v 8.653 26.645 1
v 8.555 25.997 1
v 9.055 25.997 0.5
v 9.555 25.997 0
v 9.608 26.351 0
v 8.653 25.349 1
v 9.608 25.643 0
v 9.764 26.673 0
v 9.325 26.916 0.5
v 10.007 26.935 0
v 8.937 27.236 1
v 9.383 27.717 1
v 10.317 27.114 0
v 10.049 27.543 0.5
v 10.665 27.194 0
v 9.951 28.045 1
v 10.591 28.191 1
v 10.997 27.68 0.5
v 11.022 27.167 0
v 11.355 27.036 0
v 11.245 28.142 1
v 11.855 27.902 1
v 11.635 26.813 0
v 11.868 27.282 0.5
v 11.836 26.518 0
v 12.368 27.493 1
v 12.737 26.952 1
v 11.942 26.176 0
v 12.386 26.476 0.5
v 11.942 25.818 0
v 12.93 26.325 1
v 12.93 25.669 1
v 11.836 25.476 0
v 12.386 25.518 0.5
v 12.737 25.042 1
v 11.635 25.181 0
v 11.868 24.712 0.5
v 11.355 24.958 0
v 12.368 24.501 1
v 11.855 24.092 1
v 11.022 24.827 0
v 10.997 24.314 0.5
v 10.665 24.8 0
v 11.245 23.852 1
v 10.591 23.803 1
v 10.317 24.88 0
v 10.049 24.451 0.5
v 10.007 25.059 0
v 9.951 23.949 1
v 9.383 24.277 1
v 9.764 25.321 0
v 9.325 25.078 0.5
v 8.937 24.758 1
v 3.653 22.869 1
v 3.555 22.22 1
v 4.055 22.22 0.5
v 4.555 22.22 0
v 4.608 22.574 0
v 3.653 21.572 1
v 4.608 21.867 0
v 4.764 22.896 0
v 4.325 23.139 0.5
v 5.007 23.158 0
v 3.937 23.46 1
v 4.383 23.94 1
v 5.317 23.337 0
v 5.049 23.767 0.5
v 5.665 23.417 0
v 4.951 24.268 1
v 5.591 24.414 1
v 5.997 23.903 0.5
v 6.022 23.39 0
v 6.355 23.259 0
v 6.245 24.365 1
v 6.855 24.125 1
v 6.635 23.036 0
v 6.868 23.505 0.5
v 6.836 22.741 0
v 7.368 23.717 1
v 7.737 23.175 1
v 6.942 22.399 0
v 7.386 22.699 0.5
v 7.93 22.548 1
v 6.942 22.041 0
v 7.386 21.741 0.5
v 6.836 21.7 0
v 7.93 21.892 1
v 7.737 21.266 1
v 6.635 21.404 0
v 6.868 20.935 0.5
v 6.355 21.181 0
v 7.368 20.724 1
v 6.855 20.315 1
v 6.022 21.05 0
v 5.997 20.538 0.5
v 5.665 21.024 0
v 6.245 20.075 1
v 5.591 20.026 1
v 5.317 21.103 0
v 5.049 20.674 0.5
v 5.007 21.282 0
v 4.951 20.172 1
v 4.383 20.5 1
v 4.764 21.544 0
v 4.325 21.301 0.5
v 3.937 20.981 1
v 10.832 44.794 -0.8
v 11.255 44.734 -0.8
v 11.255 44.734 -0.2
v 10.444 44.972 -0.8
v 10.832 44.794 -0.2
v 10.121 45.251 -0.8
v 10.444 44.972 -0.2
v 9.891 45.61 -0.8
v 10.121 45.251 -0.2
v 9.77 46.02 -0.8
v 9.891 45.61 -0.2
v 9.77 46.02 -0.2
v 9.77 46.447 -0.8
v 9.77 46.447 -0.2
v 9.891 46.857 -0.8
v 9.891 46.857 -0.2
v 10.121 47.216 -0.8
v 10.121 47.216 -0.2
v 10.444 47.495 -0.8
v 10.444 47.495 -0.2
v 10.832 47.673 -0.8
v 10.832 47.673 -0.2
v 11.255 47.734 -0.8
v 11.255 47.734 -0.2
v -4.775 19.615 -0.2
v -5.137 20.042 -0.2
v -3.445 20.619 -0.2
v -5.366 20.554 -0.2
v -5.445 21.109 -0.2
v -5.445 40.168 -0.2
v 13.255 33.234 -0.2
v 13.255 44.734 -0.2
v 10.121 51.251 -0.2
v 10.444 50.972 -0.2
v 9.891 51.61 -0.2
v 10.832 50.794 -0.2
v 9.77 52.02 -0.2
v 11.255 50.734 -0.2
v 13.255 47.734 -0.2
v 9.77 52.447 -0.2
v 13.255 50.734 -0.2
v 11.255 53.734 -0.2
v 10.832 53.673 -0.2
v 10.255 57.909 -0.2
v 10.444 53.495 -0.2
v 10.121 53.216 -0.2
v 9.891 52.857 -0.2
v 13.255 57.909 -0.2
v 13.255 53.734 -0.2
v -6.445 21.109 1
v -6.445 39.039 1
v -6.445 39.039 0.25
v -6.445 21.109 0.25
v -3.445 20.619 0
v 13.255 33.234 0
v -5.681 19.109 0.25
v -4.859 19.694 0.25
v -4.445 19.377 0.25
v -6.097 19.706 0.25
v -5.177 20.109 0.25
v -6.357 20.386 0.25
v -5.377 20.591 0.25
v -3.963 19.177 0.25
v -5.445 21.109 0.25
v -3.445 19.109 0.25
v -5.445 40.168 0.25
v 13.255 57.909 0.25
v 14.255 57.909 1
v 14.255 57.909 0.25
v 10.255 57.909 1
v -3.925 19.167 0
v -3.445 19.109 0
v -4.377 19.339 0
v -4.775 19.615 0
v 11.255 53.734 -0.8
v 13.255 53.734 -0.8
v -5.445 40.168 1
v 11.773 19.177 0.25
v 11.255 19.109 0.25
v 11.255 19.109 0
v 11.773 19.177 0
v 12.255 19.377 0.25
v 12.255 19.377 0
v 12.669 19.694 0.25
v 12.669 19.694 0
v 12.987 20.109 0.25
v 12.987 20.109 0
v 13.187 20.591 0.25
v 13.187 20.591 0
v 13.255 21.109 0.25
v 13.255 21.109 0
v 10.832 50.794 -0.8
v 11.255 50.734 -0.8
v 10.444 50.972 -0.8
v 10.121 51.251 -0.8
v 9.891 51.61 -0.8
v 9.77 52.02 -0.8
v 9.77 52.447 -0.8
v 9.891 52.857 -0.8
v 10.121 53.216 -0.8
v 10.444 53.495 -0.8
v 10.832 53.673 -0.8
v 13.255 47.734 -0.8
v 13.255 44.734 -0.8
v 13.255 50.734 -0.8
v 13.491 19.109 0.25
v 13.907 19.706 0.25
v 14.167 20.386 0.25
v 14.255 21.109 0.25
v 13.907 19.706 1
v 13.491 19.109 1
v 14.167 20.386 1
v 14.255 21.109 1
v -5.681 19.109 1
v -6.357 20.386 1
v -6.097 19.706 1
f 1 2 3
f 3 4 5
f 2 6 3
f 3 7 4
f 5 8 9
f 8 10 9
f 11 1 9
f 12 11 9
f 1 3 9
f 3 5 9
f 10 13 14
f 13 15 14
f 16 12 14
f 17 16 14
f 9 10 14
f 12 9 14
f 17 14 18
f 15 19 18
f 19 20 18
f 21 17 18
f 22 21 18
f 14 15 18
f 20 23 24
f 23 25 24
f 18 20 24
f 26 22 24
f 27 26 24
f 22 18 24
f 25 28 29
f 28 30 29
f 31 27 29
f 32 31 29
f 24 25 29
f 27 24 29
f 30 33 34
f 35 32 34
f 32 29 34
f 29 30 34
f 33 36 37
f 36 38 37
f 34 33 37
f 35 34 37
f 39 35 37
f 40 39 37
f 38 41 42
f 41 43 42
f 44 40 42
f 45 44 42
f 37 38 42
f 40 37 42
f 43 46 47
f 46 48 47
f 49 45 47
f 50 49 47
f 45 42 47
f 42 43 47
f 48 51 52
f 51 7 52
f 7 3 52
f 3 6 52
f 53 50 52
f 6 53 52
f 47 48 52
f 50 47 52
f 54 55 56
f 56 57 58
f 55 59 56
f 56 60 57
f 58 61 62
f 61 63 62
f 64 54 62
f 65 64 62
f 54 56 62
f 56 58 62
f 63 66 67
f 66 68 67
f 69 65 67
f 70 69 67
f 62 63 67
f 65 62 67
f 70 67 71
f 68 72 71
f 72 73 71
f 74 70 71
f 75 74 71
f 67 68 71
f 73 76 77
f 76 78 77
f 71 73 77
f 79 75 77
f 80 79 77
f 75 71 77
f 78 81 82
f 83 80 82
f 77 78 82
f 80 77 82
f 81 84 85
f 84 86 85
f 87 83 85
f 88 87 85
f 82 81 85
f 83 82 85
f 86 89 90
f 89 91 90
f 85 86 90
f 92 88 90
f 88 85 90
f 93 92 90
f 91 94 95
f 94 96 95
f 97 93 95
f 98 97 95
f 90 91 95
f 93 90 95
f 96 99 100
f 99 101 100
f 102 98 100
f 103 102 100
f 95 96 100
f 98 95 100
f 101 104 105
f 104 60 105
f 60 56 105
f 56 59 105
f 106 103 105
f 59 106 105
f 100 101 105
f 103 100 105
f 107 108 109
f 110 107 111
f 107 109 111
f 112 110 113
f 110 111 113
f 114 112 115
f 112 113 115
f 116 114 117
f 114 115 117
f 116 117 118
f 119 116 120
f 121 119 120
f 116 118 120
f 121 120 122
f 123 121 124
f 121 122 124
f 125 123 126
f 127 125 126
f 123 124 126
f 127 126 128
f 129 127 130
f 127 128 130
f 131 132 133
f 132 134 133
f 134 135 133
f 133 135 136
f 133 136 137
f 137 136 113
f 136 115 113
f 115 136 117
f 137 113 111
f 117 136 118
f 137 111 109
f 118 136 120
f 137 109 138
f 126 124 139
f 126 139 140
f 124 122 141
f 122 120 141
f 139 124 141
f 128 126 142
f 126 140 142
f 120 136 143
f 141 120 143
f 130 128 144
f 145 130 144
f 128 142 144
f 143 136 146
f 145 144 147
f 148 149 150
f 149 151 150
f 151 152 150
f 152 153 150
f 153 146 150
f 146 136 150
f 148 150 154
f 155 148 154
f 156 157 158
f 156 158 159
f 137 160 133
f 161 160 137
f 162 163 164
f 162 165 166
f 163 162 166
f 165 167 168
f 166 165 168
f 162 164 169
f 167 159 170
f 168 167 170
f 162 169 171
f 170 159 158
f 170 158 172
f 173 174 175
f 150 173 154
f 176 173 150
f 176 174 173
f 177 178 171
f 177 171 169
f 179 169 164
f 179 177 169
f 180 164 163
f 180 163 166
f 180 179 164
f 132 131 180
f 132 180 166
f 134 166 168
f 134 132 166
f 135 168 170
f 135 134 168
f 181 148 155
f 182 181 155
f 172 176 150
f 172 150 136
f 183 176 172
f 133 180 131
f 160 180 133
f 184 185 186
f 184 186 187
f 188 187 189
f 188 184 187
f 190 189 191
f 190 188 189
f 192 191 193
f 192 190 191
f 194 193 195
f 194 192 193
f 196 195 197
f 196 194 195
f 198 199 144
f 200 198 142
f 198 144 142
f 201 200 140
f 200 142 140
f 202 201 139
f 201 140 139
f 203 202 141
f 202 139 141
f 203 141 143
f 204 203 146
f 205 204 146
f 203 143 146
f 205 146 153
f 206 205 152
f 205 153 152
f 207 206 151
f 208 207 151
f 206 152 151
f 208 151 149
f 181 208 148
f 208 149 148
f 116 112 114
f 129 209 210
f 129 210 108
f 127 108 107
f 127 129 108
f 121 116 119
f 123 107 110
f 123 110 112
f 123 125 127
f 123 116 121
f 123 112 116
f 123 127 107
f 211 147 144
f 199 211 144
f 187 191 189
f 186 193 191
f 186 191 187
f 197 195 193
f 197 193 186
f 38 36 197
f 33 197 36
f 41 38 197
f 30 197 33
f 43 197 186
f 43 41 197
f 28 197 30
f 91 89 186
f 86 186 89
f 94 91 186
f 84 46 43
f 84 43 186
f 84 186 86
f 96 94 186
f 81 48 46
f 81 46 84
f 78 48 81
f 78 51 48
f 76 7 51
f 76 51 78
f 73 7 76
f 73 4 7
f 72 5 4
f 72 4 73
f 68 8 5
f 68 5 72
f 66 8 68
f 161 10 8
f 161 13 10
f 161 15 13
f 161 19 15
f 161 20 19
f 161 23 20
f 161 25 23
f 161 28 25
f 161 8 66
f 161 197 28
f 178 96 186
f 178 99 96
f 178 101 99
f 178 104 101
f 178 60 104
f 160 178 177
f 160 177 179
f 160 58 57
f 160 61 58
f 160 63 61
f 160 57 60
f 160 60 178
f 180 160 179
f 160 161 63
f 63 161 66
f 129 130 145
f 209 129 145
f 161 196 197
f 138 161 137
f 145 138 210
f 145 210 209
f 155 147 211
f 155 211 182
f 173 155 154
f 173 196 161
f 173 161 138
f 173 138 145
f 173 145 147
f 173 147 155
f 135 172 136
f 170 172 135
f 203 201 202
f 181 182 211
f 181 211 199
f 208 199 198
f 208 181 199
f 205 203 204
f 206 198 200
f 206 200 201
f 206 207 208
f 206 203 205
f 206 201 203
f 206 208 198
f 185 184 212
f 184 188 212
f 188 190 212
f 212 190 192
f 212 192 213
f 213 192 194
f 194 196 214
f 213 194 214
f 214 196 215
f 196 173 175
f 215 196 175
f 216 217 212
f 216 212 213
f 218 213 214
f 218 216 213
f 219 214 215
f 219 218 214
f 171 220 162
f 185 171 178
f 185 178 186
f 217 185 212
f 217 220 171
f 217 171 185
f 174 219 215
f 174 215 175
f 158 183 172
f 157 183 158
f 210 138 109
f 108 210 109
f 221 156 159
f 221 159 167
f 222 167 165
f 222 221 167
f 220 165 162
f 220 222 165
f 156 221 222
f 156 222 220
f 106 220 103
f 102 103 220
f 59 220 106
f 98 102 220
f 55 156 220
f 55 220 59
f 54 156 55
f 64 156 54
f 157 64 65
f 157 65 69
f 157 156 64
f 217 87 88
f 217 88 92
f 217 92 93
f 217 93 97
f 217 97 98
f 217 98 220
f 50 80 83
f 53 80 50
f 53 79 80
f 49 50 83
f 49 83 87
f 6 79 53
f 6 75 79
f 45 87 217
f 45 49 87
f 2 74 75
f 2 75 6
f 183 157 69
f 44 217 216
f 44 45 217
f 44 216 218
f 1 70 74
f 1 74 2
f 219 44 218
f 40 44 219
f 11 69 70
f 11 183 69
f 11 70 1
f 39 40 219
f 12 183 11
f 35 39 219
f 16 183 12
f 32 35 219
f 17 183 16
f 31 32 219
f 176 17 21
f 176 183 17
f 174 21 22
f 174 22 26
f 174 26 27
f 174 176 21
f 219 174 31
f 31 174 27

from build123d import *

# Parameters (mm, degrees)
BOSS_EXTRUDE1_DEPTH                             = 0.8
BOSS_EXTRUDE1_2_DEPTH                           = 0.8
BOSS_EXTRUDE3_DEPTH                             = 1
BOSS_EXTRUDE3_DEPTH_BACK                        = 0.2
FILLET1_R                                       = 2
CUT_EXTRUDE1_DEPTH                              = 0.2
BOSS_EXTRUDE4_DEPTH                             = 0.75
CSK_FOR_M2_FLAT_HEAD_MACHINE_SCREW1_D           = 2.4
CSK_FOR_M2_FLAT_HEAD_MACHINE_SCREW1_DEPTH       = 4
CSK_FOR_M2_FLAT_HEAD_MACHINE_SCREW1_CSINK_D     = 4.4
CSK_FOR_M2_FLAT_HEAD_MACHINE_SCREW1_CSINK_ANGLE = 90
CSK_FOR_M2_FLAT_HEAD_MACHINE_SCREW1_TIP         = 0.721032743


with BuildPart() as part:
    # Sketch1 → Boss-Extrude1 (new body)
    with BuildSketch(Plane.XY):
        with BuildLine():
            Line((11.255059848, 53.733600539), (13.255059848, 53.733600539))
            Line((13.255059848, 53.733600539), (13.255059848, 50.733600539))
            Line((13.255059848, 50.733600539), (11.255059848, 50.733600539))
            ThreePointArc((11.255059848, 50.733600539), (9.755059848, 52.233600539), (11.255059848, 53.733600539))
        make_face()
    extrude(amount=-BOSS_EXTRUDE1_DEPTH)



with BuildPart() as body_2:
    # Sketch1 → Boss-Extrude1 2 (new body)
    with BuildSketch(Plane.XY):
        with BuildLine():
            Line((11.255059848, 47.733600539), (13.255059848, 47.733600539))
            Line((13.255059848, 47.733600539), (13.255059848, 44.733600539))
            Line((13.255059848, 44.733600539), (11.255059848, 44.733600539))
            ThreePointArc((11.255059848, 44.733600539), (9.755059848, 46.233600539), (11.255059848, 47.733600539))
        make_face()
    extrude(amount=-BOSS_EXTRUDE1_2_DEPTH)


with BuildPart() as part_1:
    add(part.part)

    add(body_2.part)  # Boss-Extrude3 merges body 2
    # Sketch2 → Boss-Extrude3 (add, two sides)
    with BuildSketch(Plane.XY) as boss_extrude3_sk:
        Polygon((-5.444940152, 19.108600539), (13.255059848, 19.108600539), (13.255059848, 57.908600539), (10.255059848, 57.908600539), (-5.444940152, 40.168487545), align=None)
    extrude(amount=BOSS_EXTRUDE3_DEPTH)
    extrude(boss_extrude3_sk.sketch, amount=-BOSS_EXTRUDE3_DEPTH_BACK)

    # Fillet1
    fillet1_edges = [part_1.edges().sort_by_distance(p)[0] for p in [
        (-5.444940152, 19.108600539, 0.4),
        (13.255059848, 19.108600539, 0.4),
    ]]
    fillet(fillet1_edges, radius=FILLET1_R)

    # Sketch3 → Cut-Extrude1 (cut)
    with BuildSketch(Plane(origin=(0, 0, 0), x_dir=(-1, 0, 0), z_dir=(0, 0, -1))):
        Polygon((-13.255059848, 33.233600539), (-13.255059848, 19.108600539), (5.444940152, 19.108600539), (3.444940152, 20.619295727), align=None)
    extrude(amount=CUT_EXTRUDE1_DEPTH, mode=Mode.SUBTRACT)

    # Sketch4 → Boss-Extrude4 (add)
    with BuildSketch(Plane.XY.offset(1)):
        with BuildLine():
            Line((-6.444940152, 39.038544042), (-6.444940152, 21.108600539))
            ThreePointArc((-6.444940152, 21.108600539), (-6.247457228, 20.03813427), (-5.681008129, 19.108600539))
            Line((-5.681008129, 19.108600539), (13.491127826, 19.108600539))
            ThreePointArc((13.491127826, 19.108600539), (14.057576925, 20.03813427), (14.255059848, 21.108600539))
            Line((14.255059848, 21.108600539), (14.255059848, 57.908600539))
            Line((14.255059848, 57.908600539), (10.255059848, 57.908600539))
            Line((10.255059848, 57.908600539), (-6.444940152, 39.038544042))
        make_face()
    extrude(amount=-BOSS_EXTRUDE4_DEPTH)

    # CSK for M2 Flat Head Machine Screw1
    with Locations(Plane(origin=(-1.094940152, -30.37062024, 1), x_dir=(1, 0, 0), z_dir=(0, 0, 1))):
        with Locations((11.85, 56.367589763), (6.85, 52.590851795)):
            CounterSinkHole(CSK_FOR_M2_FLAT_HEAD_MACHINE_SCREW1_D / 2, CSK_FOR_M2_FLAT_HEAD_MACHINE_SCREW1_CSINK_D / 2, depth=CSK_FOR_M2_FLAT_HEAD_MACHINE_SCREW1_DEPTH, counter_sink_angle=CSK_FOR_M2_FLAT_HEAD_MACHINE_SCREW1_CSINK_ANGLE)
            with Locations((0, 0, -(CSK_FOR_M2_FLAT_HEAD_MACHINE_SCREW1_DEPTH + CSK_FOR_M2_FLAT_HEAD_MACHINE_SCREW1_TIP / 2))):  # 118° drill point
                Cone(0, CSK_FOR_M2_FLAT_HEAD_MACHINE_SCREW1_D / 2, CSK_FOR_M2_FLAT_HEAD_MACHINE_SCREW1_TIP, mode=Mode.SUBTRACT)


solid = part_1.part
